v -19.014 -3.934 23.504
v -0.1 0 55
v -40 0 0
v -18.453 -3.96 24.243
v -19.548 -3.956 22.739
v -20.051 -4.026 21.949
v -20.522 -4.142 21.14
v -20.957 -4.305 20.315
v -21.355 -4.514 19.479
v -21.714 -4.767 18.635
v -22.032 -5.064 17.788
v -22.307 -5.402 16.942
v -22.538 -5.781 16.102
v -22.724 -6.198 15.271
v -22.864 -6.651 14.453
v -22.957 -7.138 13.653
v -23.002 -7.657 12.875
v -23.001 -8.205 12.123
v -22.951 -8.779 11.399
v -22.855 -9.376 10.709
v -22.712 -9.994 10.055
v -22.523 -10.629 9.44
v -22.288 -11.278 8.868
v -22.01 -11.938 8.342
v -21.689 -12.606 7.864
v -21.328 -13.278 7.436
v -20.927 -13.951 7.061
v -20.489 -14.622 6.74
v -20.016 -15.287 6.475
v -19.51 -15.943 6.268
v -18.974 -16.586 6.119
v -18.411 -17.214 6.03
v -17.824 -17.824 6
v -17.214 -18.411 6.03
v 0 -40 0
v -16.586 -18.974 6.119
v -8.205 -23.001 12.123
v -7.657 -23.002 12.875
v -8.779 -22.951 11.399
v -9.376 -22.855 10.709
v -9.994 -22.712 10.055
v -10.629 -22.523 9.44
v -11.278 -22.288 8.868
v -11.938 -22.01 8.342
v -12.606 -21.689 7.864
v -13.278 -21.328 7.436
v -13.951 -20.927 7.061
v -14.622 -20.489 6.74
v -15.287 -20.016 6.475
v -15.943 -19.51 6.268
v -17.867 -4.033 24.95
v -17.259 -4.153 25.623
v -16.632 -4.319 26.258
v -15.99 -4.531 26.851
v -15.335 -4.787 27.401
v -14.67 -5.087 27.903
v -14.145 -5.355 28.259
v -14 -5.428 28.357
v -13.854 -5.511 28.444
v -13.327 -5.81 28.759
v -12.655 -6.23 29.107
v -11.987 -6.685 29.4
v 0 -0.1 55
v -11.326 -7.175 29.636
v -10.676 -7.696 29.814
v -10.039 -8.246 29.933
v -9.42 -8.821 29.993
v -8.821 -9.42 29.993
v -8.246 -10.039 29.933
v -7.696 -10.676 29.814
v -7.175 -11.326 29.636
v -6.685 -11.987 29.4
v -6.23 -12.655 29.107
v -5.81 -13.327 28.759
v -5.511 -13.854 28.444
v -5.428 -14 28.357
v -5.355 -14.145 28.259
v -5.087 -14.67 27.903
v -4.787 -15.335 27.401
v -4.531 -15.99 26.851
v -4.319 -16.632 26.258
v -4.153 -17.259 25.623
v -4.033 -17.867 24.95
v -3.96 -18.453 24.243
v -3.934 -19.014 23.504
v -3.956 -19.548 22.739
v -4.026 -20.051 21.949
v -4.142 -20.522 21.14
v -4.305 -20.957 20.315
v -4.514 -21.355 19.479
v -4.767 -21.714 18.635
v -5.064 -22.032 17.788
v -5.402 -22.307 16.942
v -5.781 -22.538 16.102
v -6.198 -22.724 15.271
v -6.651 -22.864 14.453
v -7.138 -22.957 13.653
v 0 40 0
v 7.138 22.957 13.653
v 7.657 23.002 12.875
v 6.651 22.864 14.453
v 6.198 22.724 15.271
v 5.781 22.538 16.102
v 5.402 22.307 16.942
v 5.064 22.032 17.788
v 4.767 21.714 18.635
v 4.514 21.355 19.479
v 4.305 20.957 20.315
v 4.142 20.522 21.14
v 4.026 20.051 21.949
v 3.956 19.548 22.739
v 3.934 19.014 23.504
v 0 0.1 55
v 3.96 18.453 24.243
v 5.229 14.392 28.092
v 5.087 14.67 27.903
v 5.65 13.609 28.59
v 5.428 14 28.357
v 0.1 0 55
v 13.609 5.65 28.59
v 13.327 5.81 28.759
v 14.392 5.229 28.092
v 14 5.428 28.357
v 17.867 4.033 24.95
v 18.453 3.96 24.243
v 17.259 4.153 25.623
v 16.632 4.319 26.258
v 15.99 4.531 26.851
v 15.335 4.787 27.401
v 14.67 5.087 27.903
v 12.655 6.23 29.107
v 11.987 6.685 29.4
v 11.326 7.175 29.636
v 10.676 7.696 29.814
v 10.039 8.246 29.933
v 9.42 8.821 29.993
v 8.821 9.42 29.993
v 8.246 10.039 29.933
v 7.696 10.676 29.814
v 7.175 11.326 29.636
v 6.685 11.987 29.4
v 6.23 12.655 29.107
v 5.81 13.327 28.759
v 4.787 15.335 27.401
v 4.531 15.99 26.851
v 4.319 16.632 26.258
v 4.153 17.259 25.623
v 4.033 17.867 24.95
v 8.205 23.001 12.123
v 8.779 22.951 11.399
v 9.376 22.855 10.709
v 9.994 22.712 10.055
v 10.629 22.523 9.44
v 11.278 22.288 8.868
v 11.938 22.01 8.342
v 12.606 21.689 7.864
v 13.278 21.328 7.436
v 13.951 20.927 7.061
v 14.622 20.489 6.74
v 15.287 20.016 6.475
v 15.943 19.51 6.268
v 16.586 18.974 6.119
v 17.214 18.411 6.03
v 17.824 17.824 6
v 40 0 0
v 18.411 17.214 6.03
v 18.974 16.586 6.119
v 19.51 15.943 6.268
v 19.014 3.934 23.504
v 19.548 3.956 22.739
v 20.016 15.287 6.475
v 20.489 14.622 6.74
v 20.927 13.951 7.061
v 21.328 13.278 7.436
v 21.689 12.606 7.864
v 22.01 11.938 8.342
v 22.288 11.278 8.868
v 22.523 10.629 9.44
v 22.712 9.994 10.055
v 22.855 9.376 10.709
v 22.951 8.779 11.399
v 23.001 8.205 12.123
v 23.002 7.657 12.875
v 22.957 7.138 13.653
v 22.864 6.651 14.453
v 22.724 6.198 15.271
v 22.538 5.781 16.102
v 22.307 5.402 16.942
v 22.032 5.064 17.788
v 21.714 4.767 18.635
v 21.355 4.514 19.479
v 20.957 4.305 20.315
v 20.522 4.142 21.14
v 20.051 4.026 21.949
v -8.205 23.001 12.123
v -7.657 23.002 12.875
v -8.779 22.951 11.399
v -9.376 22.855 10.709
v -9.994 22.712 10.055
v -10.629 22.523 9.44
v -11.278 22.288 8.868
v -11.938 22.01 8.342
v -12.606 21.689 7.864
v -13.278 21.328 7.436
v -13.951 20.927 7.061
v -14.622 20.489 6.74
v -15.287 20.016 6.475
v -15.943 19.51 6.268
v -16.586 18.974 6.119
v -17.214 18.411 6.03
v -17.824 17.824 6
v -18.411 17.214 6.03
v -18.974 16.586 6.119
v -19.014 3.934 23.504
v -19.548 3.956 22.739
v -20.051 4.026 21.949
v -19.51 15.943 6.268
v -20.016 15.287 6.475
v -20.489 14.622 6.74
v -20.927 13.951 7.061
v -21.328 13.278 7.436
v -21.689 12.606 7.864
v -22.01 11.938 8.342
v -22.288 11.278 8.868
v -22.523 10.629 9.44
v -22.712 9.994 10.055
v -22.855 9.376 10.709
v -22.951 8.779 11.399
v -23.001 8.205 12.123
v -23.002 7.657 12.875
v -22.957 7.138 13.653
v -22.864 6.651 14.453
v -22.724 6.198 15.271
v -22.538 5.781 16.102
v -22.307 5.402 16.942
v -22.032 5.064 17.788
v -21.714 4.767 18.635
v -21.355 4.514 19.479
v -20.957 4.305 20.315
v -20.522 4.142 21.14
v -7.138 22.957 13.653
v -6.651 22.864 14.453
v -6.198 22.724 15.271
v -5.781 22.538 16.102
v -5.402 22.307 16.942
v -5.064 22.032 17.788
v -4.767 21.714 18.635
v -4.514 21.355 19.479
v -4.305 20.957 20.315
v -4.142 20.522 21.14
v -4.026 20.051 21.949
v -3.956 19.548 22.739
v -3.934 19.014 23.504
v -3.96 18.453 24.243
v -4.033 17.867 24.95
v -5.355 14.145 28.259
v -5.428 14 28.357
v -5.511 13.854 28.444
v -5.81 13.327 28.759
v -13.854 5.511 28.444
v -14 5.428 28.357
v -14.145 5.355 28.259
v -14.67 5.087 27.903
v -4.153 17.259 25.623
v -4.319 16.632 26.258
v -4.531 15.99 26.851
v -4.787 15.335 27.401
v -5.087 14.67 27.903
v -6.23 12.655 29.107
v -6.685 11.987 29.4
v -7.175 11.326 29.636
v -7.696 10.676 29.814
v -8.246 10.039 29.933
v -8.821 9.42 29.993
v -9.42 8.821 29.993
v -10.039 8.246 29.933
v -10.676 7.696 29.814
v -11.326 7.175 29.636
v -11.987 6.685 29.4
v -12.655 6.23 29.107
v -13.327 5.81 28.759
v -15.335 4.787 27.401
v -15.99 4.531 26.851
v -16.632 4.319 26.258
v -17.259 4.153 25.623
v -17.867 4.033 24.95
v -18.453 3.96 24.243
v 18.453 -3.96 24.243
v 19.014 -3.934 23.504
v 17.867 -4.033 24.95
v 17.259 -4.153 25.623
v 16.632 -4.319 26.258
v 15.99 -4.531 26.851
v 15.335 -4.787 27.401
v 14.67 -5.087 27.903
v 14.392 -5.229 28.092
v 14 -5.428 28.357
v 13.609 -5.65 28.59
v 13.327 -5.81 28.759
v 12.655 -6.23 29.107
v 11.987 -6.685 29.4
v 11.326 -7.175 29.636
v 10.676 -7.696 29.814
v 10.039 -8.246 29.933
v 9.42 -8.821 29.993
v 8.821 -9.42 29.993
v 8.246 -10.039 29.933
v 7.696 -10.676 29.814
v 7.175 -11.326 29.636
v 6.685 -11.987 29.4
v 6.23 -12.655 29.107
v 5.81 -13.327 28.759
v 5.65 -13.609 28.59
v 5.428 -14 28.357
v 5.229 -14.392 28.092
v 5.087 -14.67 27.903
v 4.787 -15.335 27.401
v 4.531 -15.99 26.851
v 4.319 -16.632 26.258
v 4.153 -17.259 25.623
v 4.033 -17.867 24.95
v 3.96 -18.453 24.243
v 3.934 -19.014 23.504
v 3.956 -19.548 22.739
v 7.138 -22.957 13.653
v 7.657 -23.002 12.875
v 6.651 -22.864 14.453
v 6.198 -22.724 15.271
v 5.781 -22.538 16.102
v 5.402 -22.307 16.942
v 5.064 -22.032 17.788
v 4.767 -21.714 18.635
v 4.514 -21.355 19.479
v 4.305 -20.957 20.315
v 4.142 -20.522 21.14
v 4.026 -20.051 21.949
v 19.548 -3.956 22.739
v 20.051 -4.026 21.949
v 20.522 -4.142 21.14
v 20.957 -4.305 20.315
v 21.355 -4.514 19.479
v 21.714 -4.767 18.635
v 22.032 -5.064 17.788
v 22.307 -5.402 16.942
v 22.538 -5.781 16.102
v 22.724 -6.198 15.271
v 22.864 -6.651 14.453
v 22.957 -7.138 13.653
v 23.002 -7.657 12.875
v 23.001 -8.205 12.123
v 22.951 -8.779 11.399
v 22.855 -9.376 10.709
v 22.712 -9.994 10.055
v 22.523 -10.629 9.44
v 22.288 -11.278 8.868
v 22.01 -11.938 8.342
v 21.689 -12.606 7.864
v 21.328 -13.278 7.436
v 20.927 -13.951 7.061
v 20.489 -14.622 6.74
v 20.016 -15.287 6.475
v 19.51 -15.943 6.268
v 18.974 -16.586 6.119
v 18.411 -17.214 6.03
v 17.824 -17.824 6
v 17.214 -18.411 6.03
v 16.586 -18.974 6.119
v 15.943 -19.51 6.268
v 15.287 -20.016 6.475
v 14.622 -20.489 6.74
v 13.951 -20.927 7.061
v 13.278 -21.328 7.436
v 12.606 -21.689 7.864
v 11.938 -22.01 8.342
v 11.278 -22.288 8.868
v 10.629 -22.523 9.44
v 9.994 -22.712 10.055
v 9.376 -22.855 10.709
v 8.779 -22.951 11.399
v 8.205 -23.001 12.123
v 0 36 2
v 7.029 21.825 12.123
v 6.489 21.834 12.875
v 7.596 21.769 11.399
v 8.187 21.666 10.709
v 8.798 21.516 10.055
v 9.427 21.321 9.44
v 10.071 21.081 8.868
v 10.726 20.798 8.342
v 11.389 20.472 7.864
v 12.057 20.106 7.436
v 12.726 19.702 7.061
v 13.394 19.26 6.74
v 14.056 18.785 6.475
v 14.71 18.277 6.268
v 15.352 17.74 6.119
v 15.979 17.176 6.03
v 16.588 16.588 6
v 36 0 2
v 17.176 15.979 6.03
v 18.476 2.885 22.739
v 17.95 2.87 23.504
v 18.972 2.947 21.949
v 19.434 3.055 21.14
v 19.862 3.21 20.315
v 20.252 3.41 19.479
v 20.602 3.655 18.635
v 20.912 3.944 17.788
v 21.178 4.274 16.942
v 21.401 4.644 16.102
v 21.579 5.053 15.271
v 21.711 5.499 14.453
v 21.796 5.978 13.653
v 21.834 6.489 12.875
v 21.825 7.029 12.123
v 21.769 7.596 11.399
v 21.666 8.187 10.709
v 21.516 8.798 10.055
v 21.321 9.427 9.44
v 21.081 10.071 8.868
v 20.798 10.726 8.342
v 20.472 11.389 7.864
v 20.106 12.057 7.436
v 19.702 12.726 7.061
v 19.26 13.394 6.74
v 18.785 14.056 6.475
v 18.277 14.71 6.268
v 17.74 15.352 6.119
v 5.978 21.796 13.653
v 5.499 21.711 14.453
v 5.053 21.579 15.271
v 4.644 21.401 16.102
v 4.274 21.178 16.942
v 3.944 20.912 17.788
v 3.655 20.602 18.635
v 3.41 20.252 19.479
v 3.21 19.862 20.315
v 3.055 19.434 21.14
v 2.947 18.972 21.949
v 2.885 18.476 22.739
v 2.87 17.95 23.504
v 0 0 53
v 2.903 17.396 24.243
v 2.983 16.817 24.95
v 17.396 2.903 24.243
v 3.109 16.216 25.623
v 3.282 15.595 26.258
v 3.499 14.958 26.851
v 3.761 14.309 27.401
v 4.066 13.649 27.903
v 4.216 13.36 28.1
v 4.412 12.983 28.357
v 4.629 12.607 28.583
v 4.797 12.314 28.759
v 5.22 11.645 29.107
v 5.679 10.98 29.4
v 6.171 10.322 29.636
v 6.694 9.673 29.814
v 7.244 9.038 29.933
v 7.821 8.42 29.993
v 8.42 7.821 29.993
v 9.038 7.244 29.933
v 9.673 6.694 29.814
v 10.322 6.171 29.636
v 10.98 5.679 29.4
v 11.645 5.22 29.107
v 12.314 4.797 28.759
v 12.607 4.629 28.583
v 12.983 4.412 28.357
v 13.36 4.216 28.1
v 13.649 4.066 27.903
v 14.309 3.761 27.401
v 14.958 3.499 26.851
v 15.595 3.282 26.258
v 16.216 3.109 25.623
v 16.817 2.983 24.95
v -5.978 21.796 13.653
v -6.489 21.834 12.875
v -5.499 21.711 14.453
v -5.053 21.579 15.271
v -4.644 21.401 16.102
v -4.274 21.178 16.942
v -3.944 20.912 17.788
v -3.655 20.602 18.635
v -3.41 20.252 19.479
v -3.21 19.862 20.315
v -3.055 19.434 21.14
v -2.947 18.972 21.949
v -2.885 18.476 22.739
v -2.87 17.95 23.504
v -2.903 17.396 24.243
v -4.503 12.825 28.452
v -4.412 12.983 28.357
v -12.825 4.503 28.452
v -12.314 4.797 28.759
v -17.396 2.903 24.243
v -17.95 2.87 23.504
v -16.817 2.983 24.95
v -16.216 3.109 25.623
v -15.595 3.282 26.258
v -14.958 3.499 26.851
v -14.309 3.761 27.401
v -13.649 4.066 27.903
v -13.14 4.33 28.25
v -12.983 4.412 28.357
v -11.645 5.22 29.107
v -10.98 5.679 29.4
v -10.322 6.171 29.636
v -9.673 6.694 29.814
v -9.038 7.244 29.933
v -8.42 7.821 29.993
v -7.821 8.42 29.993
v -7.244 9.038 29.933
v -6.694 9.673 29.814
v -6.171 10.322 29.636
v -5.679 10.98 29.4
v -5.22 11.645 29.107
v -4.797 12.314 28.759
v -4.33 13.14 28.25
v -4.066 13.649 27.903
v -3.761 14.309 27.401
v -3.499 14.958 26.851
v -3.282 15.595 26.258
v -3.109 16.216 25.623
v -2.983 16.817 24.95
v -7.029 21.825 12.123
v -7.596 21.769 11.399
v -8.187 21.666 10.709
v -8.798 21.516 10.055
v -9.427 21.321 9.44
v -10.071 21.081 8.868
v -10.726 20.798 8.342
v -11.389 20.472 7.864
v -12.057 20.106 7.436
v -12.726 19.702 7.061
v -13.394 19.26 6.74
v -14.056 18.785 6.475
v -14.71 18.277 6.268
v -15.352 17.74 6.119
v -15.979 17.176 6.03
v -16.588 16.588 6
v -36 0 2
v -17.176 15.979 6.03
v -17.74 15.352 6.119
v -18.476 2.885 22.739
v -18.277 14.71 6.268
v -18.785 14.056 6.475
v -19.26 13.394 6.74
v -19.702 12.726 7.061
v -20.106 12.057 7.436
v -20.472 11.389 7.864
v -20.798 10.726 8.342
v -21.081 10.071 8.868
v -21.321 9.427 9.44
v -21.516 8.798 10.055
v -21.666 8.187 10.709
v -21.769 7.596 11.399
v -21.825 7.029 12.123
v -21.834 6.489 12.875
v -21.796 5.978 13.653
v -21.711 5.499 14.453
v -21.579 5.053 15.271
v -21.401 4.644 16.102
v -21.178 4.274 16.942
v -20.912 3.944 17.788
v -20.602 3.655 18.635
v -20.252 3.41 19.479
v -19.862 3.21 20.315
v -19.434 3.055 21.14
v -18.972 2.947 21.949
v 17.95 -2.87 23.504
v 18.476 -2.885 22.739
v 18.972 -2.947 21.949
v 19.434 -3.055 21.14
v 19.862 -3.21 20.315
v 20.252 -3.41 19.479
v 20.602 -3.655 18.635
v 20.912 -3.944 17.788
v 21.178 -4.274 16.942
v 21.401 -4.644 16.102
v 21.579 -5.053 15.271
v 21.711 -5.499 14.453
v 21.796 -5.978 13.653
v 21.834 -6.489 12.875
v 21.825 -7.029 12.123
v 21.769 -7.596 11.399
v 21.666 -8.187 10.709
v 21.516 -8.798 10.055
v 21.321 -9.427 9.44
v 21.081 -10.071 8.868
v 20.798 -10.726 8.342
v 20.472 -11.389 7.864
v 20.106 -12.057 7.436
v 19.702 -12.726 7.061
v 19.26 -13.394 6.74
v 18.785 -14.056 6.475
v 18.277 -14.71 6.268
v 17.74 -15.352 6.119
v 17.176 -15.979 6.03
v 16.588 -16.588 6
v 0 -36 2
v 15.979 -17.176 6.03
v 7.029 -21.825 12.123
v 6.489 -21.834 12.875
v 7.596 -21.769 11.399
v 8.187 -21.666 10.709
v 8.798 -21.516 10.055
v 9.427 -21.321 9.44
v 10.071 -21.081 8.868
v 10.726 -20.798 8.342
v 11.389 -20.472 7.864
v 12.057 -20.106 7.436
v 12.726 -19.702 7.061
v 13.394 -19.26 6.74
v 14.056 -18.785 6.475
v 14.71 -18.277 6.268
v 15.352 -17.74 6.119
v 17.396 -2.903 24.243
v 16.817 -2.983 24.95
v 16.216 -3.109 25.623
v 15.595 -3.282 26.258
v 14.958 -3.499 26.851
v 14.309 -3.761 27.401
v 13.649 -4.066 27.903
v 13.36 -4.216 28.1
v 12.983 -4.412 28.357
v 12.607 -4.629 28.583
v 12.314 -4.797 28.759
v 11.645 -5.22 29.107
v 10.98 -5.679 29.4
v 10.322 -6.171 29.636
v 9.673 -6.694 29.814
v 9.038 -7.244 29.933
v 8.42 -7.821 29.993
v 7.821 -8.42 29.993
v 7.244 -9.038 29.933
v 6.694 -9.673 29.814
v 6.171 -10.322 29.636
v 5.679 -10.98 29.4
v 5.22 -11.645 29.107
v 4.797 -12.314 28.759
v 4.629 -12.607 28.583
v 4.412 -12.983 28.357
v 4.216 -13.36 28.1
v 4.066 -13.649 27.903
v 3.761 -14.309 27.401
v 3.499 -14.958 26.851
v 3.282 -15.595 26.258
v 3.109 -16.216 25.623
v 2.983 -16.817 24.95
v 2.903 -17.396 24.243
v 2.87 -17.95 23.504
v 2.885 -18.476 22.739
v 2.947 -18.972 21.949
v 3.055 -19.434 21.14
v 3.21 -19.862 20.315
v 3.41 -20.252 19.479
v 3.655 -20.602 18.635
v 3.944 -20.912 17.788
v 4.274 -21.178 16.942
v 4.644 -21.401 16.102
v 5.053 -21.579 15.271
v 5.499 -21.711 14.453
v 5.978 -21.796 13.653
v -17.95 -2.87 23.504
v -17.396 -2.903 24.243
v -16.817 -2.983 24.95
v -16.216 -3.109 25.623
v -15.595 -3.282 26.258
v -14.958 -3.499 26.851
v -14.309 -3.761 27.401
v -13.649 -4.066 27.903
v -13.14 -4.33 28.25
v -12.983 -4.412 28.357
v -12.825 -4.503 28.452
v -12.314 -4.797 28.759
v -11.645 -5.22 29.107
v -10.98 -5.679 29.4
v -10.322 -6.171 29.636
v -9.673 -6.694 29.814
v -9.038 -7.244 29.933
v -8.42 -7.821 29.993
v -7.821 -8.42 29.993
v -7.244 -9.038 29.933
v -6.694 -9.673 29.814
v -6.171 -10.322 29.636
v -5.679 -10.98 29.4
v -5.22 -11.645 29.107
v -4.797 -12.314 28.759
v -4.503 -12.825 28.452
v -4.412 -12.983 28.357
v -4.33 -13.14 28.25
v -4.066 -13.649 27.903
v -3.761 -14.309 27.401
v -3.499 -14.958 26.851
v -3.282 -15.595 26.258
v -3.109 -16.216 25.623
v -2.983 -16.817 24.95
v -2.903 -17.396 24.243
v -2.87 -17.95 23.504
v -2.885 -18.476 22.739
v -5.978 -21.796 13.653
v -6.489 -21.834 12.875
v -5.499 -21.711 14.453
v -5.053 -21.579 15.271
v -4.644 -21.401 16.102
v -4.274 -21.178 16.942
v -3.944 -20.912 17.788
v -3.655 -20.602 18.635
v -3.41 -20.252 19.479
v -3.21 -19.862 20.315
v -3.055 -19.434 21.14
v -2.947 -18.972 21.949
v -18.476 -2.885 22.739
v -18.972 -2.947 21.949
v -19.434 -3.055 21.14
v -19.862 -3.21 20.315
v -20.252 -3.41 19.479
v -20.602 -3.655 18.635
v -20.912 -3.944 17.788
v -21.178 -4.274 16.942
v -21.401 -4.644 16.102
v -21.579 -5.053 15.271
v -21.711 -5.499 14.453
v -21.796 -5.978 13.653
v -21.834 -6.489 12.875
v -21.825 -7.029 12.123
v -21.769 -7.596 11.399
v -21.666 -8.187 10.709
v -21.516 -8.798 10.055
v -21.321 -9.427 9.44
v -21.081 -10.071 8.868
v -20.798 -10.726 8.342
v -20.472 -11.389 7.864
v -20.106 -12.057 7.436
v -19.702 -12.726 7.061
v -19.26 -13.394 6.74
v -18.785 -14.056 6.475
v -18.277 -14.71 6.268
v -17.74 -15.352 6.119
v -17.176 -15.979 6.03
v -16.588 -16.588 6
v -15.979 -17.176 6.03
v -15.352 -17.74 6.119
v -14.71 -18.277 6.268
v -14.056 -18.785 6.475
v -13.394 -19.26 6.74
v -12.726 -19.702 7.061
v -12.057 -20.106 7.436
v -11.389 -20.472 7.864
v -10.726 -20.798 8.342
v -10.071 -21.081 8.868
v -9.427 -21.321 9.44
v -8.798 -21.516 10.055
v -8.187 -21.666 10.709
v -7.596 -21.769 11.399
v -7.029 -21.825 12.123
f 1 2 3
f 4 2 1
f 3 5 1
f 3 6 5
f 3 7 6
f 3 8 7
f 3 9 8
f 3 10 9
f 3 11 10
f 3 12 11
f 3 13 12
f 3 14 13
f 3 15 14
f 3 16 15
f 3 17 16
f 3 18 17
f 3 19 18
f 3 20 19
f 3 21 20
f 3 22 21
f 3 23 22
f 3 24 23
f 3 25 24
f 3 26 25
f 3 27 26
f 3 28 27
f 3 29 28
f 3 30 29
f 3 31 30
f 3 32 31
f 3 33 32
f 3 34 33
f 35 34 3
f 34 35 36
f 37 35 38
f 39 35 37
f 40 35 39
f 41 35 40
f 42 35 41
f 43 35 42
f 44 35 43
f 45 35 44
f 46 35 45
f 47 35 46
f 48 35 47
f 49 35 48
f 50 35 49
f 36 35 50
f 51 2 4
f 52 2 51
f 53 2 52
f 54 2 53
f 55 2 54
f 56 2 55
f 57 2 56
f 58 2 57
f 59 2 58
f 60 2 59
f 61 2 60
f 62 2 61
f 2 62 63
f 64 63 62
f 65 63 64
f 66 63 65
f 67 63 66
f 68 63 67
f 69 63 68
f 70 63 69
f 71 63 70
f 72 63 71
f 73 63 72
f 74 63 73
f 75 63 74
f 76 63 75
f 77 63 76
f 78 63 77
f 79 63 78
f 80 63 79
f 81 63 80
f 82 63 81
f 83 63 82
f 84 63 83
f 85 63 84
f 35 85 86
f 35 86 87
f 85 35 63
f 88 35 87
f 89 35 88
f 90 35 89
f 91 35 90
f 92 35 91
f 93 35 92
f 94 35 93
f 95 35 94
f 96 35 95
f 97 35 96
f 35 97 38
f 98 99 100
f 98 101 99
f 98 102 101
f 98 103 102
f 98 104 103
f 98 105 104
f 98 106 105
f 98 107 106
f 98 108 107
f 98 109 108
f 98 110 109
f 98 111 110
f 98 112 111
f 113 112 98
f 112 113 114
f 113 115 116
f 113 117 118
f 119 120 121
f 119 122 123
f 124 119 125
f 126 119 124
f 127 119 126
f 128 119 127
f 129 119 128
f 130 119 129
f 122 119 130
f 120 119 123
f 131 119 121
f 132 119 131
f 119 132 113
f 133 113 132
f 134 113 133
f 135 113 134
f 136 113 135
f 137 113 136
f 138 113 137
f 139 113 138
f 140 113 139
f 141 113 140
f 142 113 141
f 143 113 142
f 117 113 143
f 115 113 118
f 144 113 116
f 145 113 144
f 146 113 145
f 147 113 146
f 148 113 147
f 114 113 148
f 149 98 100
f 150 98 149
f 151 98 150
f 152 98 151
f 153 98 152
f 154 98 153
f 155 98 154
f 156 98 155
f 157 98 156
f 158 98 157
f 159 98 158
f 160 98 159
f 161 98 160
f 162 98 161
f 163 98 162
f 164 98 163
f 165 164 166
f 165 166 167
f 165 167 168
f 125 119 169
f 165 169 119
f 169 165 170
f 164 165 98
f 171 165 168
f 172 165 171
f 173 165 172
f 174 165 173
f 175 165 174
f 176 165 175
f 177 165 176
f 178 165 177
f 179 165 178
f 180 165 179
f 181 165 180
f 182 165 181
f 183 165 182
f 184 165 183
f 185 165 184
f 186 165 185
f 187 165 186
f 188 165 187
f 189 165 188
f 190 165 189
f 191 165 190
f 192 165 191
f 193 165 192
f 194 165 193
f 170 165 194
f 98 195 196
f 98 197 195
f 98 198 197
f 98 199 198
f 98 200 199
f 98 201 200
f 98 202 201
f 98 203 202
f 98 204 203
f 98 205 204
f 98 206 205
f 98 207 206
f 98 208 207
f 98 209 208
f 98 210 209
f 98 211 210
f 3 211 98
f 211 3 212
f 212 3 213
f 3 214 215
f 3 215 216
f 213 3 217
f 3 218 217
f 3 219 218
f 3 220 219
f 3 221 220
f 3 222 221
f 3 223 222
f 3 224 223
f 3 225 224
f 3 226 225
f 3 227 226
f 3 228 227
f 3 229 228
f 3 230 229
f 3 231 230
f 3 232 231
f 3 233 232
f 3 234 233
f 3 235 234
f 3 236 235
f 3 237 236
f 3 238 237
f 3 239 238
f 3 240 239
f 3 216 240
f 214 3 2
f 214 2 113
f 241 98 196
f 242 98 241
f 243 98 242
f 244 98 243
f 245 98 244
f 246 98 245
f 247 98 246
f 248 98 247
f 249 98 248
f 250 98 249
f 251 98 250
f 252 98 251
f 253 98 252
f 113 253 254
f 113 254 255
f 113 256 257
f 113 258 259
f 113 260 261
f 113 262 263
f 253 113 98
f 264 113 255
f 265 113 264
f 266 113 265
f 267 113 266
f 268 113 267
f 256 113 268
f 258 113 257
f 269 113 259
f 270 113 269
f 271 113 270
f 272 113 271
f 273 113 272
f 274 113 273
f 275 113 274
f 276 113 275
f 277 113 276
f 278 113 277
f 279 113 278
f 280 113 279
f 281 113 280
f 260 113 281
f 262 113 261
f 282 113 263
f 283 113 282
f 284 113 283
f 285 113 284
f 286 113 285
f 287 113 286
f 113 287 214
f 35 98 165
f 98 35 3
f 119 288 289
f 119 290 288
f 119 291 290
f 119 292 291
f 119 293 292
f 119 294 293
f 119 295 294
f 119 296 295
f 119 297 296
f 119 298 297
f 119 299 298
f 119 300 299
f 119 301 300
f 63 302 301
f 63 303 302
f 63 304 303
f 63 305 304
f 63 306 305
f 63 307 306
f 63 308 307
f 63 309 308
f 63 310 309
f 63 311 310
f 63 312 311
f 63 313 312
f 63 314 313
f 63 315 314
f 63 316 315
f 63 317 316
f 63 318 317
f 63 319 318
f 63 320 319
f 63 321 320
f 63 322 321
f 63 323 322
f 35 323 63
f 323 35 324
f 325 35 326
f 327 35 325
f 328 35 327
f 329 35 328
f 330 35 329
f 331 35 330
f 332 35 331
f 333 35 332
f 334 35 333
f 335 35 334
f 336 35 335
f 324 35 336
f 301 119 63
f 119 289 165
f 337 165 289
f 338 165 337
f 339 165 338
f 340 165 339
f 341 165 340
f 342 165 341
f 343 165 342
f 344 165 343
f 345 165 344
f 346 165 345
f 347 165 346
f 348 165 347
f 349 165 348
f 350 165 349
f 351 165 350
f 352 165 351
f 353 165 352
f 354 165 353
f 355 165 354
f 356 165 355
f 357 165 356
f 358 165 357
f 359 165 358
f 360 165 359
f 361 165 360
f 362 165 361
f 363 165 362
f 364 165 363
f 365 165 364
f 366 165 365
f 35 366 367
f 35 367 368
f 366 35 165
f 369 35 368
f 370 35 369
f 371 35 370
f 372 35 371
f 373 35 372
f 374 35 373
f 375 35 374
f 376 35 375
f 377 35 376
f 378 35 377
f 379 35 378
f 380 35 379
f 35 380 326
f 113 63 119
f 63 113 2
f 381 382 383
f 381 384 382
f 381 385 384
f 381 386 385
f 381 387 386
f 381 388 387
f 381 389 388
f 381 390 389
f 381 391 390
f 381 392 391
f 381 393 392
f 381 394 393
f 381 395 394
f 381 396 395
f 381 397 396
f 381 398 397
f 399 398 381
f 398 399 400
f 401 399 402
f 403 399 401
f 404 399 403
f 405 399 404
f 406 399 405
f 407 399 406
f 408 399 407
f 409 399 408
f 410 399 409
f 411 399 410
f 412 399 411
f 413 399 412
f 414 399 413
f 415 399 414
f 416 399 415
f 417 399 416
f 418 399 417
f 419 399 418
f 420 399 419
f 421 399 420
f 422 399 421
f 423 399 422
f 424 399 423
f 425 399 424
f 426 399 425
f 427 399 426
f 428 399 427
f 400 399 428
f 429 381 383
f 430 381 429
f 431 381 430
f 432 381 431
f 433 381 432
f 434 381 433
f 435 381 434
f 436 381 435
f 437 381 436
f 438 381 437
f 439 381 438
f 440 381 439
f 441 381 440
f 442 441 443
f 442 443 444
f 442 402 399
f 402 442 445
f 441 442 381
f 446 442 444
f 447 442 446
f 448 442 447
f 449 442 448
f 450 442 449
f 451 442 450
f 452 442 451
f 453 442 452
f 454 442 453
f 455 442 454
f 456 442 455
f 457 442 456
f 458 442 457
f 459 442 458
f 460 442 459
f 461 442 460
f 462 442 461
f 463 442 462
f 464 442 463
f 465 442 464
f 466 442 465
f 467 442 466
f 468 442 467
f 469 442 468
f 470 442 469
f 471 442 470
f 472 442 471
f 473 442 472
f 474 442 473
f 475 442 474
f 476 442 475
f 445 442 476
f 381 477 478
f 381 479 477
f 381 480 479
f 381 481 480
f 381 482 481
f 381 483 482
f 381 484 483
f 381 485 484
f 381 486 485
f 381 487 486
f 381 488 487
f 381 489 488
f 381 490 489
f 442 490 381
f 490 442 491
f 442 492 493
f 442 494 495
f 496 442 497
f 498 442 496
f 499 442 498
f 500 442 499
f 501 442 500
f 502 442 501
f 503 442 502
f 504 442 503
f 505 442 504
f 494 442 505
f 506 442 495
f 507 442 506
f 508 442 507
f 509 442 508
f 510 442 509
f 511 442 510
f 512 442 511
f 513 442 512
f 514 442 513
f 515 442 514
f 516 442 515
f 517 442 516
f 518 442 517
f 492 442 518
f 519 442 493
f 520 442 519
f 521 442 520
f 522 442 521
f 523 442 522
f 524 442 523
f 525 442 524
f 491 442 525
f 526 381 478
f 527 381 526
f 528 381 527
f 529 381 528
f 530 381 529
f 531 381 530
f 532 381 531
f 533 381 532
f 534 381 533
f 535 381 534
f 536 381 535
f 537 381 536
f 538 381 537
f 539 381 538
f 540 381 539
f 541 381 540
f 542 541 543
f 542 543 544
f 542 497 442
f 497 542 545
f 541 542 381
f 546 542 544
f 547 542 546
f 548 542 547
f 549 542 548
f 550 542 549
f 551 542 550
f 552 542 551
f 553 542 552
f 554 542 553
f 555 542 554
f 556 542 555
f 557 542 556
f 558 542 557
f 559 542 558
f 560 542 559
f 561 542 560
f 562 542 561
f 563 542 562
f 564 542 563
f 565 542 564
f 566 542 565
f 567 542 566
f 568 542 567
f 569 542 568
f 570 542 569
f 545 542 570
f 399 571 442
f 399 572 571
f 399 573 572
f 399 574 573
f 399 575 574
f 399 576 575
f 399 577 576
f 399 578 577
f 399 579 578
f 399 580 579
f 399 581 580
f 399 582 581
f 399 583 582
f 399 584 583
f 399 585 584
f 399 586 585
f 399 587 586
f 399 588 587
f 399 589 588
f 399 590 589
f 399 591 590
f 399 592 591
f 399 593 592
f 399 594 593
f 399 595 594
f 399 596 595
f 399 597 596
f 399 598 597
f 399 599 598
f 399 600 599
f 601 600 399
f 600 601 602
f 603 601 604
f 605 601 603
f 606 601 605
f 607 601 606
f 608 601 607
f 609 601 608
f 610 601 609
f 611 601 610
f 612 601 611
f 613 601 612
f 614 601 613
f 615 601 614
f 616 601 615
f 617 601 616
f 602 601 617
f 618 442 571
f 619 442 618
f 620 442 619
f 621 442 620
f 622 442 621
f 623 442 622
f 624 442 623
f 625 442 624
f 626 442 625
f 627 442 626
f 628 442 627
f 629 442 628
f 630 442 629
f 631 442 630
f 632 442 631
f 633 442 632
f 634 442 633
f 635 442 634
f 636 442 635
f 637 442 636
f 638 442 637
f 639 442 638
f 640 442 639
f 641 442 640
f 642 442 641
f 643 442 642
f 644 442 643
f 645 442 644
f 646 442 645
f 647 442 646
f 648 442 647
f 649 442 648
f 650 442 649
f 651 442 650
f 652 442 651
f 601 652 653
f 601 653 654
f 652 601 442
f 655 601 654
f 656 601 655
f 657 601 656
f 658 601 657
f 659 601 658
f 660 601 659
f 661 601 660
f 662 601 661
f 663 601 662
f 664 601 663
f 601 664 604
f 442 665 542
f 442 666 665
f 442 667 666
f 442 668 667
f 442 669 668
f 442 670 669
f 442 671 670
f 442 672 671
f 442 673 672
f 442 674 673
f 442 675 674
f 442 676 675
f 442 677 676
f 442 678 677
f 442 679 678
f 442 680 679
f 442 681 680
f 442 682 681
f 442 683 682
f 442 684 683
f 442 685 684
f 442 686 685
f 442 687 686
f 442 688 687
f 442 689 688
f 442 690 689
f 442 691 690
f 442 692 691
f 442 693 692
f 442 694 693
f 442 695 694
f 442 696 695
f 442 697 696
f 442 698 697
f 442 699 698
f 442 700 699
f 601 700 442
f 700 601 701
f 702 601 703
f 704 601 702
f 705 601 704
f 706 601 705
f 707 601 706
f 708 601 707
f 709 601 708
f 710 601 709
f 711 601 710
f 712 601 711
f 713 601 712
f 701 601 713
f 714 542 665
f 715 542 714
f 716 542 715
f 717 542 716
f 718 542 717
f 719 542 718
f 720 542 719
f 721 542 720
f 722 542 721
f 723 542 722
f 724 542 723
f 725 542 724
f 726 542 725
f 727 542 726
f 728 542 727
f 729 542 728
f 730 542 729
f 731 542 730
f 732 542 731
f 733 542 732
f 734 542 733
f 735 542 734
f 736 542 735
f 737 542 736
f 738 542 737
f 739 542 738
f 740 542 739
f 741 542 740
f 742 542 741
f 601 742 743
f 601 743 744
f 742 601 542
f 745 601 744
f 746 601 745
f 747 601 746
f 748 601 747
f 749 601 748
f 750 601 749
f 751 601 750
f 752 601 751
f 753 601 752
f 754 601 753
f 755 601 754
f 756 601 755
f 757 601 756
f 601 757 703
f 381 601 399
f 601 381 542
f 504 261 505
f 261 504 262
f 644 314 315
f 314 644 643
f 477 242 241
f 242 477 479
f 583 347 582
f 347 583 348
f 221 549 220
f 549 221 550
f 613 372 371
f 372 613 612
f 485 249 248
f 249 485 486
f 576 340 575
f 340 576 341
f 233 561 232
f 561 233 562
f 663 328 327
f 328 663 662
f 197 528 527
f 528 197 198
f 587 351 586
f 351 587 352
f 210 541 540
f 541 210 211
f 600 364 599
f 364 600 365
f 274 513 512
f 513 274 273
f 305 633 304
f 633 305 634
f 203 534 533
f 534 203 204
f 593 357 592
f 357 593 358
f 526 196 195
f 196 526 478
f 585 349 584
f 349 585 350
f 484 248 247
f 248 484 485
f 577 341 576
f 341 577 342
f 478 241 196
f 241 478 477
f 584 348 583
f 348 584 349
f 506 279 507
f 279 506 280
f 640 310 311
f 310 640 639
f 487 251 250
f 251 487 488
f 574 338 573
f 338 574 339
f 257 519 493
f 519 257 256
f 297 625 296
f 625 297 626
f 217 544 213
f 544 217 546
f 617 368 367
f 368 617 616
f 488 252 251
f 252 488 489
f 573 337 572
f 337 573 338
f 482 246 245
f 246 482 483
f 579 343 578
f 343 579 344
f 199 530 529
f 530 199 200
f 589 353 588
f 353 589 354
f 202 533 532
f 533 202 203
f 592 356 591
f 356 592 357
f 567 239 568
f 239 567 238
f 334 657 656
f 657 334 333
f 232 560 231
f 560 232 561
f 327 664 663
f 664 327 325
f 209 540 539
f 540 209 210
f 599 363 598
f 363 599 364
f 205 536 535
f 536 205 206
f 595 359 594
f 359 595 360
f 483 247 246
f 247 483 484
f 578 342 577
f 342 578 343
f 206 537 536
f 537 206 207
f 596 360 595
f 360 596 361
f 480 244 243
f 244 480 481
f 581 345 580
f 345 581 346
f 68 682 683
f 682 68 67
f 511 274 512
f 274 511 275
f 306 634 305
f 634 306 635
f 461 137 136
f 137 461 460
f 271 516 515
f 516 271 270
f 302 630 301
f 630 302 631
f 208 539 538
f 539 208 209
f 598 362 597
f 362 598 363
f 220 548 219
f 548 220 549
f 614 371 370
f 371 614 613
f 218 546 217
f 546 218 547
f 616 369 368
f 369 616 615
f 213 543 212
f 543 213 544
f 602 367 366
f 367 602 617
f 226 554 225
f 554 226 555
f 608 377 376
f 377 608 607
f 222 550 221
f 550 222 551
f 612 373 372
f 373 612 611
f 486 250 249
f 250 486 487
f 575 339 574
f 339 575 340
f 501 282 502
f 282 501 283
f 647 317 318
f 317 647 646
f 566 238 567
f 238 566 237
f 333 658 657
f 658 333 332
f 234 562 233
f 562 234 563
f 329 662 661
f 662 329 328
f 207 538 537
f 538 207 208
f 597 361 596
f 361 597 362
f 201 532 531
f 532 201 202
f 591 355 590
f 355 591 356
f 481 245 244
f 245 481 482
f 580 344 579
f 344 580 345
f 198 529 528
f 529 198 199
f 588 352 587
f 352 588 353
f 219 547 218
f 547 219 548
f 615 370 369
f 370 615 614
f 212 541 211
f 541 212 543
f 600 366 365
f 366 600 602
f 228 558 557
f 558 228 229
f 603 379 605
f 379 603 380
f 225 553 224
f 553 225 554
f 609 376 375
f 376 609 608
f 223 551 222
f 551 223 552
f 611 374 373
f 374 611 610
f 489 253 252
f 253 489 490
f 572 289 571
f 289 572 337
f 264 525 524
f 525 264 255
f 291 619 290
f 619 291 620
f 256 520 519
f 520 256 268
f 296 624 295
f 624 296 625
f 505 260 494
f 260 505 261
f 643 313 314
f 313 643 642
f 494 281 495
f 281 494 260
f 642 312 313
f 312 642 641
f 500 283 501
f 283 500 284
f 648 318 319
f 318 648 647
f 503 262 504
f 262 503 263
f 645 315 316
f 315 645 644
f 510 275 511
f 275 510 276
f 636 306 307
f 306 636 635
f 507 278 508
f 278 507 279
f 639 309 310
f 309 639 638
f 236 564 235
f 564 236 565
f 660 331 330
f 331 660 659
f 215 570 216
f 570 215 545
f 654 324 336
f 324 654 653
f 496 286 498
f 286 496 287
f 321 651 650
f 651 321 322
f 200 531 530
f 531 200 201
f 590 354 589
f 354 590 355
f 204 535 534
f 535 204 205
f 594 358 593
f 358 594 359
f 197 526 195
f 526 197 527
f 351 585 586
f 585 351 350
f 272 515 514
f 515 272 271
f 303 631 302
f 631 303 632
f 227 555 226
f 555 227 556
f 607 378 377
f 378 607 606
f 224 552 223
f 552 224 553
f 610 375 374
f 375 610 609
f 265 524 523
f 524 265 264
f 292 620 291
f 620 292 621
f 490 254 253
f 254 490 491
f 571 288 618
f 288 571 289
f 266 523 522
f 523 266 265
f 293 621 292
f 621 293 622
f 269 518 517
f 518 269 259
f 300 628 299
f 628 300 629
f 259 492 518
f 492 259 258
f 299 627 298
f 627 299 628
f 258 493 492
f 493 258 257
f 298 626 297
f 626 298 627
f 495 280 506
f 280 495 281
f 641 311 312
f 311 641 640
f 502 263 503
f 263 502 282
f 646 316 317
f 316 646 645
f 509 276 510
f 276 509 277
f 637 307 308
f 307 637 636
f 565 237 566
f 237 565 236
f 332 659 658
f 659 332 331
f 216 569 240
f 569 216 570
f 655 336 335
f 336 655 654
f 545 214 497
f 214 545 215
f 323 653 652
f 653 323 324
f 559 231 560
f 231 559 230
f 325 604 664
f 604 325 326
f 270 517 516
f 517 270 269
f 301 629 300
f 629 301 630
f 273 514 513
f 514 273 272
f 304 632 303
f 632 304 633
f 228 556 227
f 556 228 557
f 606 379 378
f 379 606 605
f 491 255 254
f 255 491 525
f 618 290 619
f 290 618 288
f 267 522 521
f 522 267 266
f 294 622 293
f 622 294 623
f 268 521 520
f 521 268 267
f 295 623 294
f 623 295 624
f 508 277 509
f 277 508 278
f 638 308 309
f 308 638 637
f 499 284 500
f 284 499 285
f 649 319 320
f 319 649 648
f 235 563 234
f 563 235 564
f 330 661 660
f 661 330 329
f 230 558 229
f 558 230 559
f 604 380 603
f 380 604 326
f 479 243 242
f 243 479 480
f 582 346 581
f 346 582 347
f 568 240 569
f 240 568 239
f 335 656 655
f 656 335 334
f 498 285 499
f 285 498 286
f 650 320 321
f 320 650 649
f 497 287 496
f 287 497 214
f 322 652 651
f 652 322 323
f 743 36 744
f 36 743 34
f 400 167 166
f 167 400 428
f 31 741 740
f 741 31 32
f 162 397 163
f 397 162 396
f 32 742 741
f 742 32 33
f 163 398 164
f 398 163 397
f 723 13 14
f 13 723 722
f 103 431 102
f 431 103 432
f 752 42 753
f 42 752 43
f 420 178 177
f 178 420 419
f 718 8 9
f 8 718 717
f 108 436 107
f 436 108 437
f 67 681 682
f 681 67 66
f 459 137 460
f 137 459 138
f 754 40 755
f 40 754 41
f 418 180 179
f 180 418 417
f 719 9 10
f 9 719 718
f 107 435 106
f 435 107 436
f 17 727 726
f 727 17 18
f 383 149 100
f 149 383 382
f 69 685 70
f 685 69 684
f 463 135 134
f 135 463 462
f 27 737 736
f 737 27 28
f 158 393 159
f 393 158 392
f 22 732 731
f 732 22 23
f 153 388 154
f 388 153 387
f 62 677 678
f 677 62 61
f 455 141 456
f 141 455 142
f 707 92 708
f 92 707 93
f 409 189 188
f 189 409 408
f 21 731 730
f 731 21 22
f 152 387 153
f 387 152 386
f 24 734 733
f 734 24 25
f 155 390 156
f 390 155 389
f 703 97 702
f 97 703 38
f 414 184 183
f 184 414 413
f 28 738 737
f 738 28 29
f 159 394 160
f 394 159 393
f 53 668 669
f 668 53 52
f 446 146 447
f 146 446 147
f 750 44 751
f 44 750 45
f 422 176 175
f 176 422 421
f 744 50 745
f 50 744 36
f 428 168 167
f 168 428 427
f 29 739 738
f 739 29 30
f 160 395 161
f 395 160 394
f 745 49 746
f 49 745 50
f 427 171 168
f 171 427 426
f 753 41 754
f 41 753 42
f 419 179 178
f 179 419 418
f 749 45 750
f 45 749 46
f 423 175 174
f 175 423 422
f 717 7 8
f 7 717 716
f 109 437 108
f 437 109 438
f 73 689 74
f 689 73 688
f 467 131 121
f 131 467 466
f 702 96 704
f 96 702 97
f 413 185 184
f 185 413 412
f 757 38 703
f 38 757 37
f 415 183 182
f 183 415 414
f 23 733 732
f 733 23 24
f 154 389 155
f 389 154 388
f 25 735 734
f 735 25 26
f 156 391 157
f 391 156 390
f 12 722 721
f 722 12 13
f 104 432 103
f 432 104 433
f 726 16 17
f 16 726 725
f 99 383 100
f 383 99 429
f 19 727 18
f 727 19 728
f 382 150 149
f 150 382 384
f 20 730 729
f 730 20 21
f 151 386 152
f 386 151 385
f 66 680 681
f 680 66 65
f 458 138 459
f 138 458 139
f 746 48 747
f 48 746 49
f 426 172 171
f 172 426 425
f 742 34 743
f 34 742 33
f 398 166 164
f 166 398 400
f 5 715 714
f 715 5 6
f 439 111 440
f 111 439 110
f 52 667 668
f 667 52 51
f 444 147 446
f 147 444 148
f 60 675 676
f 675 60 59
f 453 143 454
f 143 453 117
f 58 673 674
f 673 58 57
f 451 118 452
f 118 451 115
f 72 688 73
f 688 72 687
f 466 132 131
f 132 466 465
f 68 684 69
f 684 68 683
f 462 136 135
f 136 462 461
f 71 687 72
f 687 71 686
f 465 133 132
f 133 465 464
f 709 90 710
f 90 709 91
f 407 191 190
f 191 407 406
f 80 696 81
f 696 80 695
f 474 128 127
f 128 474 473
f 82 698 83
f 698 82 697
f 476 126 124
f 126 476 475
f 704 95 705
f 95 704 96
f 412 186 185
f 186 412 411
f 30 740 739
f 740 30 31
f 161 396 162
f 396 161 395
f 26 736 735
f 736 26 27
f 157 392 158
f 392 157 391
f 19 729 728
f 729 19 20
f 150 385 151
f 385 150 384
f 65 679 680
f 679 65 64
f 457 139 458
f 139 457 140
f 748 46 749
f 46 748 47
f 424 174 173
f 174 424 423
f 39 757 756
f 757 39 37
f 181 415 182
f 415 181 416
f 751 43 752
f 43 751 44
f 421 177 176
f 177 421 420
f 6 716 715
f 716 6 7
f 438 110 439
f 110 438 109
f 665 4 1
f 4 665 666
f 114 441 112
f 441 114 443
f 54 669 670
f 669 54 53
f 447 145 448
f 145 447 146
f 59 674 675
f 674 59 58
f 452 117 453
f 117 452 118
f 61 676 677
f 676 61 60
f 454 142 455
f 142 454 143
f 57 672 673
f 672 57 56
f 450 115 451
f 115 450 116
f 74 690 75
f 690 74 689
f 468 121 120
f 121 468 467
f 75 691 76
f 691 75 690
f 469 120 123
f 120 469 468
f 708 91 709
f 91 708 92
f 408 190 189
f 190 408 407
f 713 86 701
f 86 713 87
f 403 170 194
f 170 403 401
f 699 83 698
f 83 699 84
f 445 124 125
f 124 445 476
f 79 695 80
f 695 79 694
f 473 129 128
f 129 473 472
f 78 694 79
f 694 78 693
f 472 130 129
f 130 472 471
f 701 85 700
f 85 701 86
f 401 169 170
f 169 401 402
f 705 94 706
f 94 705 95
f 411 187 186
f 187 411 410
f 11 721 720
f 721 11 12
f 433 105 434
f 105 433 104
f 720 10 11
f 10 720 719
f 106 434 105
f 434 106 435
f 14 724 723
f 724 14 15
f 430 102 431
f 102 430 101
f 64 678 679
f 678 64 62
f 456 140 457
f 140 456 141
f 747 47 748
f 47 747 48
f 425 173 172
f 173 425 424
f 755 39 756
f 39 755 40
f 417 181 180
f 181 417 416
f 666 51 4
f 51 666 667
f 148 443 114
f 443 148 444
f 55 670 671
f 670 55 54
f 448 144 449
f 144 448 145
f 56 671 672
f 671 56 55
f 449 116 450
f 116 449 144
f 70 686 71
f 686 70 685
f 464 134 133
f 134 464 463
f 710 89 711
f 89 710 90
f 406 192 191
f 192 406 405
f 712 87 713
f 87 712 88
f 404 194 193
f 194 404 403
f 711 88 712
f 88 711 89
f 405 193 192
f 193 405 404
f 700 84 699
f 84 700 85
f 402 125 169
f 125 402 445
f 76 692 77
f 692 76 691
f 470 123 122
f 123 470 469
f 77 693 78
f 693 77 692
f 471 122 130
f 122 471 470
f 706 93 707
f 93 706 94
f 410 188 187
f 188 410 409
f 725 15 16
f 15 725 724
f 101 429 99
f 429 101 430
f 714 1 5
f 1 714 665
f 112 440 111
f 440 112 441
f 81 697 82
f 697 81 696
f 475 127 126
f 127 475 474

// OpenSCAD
// piramid to be used to handle bigger elements edges during painting


module piramid() {
  $fn=4;
  difference() {
    cylinder(55,40,0.1, false);

    translate([0,0,2]) {
      cylinder(51,36, 0, false);
    }
  }
}

module holes() {
  $fn=89;
  union() {
    rotate([45, 90, 0]) {
      translate([-18,0,-30]) {
        cylinder(75, 12, 12, false);
      }
    }

    rotate([-45, 90, 0]) {
      translate([-18,0,-30]) {
        cylinder(75, 12, 12, false);
      }
    }
  }
}

difference() {
    piramid();
    holes();
}
